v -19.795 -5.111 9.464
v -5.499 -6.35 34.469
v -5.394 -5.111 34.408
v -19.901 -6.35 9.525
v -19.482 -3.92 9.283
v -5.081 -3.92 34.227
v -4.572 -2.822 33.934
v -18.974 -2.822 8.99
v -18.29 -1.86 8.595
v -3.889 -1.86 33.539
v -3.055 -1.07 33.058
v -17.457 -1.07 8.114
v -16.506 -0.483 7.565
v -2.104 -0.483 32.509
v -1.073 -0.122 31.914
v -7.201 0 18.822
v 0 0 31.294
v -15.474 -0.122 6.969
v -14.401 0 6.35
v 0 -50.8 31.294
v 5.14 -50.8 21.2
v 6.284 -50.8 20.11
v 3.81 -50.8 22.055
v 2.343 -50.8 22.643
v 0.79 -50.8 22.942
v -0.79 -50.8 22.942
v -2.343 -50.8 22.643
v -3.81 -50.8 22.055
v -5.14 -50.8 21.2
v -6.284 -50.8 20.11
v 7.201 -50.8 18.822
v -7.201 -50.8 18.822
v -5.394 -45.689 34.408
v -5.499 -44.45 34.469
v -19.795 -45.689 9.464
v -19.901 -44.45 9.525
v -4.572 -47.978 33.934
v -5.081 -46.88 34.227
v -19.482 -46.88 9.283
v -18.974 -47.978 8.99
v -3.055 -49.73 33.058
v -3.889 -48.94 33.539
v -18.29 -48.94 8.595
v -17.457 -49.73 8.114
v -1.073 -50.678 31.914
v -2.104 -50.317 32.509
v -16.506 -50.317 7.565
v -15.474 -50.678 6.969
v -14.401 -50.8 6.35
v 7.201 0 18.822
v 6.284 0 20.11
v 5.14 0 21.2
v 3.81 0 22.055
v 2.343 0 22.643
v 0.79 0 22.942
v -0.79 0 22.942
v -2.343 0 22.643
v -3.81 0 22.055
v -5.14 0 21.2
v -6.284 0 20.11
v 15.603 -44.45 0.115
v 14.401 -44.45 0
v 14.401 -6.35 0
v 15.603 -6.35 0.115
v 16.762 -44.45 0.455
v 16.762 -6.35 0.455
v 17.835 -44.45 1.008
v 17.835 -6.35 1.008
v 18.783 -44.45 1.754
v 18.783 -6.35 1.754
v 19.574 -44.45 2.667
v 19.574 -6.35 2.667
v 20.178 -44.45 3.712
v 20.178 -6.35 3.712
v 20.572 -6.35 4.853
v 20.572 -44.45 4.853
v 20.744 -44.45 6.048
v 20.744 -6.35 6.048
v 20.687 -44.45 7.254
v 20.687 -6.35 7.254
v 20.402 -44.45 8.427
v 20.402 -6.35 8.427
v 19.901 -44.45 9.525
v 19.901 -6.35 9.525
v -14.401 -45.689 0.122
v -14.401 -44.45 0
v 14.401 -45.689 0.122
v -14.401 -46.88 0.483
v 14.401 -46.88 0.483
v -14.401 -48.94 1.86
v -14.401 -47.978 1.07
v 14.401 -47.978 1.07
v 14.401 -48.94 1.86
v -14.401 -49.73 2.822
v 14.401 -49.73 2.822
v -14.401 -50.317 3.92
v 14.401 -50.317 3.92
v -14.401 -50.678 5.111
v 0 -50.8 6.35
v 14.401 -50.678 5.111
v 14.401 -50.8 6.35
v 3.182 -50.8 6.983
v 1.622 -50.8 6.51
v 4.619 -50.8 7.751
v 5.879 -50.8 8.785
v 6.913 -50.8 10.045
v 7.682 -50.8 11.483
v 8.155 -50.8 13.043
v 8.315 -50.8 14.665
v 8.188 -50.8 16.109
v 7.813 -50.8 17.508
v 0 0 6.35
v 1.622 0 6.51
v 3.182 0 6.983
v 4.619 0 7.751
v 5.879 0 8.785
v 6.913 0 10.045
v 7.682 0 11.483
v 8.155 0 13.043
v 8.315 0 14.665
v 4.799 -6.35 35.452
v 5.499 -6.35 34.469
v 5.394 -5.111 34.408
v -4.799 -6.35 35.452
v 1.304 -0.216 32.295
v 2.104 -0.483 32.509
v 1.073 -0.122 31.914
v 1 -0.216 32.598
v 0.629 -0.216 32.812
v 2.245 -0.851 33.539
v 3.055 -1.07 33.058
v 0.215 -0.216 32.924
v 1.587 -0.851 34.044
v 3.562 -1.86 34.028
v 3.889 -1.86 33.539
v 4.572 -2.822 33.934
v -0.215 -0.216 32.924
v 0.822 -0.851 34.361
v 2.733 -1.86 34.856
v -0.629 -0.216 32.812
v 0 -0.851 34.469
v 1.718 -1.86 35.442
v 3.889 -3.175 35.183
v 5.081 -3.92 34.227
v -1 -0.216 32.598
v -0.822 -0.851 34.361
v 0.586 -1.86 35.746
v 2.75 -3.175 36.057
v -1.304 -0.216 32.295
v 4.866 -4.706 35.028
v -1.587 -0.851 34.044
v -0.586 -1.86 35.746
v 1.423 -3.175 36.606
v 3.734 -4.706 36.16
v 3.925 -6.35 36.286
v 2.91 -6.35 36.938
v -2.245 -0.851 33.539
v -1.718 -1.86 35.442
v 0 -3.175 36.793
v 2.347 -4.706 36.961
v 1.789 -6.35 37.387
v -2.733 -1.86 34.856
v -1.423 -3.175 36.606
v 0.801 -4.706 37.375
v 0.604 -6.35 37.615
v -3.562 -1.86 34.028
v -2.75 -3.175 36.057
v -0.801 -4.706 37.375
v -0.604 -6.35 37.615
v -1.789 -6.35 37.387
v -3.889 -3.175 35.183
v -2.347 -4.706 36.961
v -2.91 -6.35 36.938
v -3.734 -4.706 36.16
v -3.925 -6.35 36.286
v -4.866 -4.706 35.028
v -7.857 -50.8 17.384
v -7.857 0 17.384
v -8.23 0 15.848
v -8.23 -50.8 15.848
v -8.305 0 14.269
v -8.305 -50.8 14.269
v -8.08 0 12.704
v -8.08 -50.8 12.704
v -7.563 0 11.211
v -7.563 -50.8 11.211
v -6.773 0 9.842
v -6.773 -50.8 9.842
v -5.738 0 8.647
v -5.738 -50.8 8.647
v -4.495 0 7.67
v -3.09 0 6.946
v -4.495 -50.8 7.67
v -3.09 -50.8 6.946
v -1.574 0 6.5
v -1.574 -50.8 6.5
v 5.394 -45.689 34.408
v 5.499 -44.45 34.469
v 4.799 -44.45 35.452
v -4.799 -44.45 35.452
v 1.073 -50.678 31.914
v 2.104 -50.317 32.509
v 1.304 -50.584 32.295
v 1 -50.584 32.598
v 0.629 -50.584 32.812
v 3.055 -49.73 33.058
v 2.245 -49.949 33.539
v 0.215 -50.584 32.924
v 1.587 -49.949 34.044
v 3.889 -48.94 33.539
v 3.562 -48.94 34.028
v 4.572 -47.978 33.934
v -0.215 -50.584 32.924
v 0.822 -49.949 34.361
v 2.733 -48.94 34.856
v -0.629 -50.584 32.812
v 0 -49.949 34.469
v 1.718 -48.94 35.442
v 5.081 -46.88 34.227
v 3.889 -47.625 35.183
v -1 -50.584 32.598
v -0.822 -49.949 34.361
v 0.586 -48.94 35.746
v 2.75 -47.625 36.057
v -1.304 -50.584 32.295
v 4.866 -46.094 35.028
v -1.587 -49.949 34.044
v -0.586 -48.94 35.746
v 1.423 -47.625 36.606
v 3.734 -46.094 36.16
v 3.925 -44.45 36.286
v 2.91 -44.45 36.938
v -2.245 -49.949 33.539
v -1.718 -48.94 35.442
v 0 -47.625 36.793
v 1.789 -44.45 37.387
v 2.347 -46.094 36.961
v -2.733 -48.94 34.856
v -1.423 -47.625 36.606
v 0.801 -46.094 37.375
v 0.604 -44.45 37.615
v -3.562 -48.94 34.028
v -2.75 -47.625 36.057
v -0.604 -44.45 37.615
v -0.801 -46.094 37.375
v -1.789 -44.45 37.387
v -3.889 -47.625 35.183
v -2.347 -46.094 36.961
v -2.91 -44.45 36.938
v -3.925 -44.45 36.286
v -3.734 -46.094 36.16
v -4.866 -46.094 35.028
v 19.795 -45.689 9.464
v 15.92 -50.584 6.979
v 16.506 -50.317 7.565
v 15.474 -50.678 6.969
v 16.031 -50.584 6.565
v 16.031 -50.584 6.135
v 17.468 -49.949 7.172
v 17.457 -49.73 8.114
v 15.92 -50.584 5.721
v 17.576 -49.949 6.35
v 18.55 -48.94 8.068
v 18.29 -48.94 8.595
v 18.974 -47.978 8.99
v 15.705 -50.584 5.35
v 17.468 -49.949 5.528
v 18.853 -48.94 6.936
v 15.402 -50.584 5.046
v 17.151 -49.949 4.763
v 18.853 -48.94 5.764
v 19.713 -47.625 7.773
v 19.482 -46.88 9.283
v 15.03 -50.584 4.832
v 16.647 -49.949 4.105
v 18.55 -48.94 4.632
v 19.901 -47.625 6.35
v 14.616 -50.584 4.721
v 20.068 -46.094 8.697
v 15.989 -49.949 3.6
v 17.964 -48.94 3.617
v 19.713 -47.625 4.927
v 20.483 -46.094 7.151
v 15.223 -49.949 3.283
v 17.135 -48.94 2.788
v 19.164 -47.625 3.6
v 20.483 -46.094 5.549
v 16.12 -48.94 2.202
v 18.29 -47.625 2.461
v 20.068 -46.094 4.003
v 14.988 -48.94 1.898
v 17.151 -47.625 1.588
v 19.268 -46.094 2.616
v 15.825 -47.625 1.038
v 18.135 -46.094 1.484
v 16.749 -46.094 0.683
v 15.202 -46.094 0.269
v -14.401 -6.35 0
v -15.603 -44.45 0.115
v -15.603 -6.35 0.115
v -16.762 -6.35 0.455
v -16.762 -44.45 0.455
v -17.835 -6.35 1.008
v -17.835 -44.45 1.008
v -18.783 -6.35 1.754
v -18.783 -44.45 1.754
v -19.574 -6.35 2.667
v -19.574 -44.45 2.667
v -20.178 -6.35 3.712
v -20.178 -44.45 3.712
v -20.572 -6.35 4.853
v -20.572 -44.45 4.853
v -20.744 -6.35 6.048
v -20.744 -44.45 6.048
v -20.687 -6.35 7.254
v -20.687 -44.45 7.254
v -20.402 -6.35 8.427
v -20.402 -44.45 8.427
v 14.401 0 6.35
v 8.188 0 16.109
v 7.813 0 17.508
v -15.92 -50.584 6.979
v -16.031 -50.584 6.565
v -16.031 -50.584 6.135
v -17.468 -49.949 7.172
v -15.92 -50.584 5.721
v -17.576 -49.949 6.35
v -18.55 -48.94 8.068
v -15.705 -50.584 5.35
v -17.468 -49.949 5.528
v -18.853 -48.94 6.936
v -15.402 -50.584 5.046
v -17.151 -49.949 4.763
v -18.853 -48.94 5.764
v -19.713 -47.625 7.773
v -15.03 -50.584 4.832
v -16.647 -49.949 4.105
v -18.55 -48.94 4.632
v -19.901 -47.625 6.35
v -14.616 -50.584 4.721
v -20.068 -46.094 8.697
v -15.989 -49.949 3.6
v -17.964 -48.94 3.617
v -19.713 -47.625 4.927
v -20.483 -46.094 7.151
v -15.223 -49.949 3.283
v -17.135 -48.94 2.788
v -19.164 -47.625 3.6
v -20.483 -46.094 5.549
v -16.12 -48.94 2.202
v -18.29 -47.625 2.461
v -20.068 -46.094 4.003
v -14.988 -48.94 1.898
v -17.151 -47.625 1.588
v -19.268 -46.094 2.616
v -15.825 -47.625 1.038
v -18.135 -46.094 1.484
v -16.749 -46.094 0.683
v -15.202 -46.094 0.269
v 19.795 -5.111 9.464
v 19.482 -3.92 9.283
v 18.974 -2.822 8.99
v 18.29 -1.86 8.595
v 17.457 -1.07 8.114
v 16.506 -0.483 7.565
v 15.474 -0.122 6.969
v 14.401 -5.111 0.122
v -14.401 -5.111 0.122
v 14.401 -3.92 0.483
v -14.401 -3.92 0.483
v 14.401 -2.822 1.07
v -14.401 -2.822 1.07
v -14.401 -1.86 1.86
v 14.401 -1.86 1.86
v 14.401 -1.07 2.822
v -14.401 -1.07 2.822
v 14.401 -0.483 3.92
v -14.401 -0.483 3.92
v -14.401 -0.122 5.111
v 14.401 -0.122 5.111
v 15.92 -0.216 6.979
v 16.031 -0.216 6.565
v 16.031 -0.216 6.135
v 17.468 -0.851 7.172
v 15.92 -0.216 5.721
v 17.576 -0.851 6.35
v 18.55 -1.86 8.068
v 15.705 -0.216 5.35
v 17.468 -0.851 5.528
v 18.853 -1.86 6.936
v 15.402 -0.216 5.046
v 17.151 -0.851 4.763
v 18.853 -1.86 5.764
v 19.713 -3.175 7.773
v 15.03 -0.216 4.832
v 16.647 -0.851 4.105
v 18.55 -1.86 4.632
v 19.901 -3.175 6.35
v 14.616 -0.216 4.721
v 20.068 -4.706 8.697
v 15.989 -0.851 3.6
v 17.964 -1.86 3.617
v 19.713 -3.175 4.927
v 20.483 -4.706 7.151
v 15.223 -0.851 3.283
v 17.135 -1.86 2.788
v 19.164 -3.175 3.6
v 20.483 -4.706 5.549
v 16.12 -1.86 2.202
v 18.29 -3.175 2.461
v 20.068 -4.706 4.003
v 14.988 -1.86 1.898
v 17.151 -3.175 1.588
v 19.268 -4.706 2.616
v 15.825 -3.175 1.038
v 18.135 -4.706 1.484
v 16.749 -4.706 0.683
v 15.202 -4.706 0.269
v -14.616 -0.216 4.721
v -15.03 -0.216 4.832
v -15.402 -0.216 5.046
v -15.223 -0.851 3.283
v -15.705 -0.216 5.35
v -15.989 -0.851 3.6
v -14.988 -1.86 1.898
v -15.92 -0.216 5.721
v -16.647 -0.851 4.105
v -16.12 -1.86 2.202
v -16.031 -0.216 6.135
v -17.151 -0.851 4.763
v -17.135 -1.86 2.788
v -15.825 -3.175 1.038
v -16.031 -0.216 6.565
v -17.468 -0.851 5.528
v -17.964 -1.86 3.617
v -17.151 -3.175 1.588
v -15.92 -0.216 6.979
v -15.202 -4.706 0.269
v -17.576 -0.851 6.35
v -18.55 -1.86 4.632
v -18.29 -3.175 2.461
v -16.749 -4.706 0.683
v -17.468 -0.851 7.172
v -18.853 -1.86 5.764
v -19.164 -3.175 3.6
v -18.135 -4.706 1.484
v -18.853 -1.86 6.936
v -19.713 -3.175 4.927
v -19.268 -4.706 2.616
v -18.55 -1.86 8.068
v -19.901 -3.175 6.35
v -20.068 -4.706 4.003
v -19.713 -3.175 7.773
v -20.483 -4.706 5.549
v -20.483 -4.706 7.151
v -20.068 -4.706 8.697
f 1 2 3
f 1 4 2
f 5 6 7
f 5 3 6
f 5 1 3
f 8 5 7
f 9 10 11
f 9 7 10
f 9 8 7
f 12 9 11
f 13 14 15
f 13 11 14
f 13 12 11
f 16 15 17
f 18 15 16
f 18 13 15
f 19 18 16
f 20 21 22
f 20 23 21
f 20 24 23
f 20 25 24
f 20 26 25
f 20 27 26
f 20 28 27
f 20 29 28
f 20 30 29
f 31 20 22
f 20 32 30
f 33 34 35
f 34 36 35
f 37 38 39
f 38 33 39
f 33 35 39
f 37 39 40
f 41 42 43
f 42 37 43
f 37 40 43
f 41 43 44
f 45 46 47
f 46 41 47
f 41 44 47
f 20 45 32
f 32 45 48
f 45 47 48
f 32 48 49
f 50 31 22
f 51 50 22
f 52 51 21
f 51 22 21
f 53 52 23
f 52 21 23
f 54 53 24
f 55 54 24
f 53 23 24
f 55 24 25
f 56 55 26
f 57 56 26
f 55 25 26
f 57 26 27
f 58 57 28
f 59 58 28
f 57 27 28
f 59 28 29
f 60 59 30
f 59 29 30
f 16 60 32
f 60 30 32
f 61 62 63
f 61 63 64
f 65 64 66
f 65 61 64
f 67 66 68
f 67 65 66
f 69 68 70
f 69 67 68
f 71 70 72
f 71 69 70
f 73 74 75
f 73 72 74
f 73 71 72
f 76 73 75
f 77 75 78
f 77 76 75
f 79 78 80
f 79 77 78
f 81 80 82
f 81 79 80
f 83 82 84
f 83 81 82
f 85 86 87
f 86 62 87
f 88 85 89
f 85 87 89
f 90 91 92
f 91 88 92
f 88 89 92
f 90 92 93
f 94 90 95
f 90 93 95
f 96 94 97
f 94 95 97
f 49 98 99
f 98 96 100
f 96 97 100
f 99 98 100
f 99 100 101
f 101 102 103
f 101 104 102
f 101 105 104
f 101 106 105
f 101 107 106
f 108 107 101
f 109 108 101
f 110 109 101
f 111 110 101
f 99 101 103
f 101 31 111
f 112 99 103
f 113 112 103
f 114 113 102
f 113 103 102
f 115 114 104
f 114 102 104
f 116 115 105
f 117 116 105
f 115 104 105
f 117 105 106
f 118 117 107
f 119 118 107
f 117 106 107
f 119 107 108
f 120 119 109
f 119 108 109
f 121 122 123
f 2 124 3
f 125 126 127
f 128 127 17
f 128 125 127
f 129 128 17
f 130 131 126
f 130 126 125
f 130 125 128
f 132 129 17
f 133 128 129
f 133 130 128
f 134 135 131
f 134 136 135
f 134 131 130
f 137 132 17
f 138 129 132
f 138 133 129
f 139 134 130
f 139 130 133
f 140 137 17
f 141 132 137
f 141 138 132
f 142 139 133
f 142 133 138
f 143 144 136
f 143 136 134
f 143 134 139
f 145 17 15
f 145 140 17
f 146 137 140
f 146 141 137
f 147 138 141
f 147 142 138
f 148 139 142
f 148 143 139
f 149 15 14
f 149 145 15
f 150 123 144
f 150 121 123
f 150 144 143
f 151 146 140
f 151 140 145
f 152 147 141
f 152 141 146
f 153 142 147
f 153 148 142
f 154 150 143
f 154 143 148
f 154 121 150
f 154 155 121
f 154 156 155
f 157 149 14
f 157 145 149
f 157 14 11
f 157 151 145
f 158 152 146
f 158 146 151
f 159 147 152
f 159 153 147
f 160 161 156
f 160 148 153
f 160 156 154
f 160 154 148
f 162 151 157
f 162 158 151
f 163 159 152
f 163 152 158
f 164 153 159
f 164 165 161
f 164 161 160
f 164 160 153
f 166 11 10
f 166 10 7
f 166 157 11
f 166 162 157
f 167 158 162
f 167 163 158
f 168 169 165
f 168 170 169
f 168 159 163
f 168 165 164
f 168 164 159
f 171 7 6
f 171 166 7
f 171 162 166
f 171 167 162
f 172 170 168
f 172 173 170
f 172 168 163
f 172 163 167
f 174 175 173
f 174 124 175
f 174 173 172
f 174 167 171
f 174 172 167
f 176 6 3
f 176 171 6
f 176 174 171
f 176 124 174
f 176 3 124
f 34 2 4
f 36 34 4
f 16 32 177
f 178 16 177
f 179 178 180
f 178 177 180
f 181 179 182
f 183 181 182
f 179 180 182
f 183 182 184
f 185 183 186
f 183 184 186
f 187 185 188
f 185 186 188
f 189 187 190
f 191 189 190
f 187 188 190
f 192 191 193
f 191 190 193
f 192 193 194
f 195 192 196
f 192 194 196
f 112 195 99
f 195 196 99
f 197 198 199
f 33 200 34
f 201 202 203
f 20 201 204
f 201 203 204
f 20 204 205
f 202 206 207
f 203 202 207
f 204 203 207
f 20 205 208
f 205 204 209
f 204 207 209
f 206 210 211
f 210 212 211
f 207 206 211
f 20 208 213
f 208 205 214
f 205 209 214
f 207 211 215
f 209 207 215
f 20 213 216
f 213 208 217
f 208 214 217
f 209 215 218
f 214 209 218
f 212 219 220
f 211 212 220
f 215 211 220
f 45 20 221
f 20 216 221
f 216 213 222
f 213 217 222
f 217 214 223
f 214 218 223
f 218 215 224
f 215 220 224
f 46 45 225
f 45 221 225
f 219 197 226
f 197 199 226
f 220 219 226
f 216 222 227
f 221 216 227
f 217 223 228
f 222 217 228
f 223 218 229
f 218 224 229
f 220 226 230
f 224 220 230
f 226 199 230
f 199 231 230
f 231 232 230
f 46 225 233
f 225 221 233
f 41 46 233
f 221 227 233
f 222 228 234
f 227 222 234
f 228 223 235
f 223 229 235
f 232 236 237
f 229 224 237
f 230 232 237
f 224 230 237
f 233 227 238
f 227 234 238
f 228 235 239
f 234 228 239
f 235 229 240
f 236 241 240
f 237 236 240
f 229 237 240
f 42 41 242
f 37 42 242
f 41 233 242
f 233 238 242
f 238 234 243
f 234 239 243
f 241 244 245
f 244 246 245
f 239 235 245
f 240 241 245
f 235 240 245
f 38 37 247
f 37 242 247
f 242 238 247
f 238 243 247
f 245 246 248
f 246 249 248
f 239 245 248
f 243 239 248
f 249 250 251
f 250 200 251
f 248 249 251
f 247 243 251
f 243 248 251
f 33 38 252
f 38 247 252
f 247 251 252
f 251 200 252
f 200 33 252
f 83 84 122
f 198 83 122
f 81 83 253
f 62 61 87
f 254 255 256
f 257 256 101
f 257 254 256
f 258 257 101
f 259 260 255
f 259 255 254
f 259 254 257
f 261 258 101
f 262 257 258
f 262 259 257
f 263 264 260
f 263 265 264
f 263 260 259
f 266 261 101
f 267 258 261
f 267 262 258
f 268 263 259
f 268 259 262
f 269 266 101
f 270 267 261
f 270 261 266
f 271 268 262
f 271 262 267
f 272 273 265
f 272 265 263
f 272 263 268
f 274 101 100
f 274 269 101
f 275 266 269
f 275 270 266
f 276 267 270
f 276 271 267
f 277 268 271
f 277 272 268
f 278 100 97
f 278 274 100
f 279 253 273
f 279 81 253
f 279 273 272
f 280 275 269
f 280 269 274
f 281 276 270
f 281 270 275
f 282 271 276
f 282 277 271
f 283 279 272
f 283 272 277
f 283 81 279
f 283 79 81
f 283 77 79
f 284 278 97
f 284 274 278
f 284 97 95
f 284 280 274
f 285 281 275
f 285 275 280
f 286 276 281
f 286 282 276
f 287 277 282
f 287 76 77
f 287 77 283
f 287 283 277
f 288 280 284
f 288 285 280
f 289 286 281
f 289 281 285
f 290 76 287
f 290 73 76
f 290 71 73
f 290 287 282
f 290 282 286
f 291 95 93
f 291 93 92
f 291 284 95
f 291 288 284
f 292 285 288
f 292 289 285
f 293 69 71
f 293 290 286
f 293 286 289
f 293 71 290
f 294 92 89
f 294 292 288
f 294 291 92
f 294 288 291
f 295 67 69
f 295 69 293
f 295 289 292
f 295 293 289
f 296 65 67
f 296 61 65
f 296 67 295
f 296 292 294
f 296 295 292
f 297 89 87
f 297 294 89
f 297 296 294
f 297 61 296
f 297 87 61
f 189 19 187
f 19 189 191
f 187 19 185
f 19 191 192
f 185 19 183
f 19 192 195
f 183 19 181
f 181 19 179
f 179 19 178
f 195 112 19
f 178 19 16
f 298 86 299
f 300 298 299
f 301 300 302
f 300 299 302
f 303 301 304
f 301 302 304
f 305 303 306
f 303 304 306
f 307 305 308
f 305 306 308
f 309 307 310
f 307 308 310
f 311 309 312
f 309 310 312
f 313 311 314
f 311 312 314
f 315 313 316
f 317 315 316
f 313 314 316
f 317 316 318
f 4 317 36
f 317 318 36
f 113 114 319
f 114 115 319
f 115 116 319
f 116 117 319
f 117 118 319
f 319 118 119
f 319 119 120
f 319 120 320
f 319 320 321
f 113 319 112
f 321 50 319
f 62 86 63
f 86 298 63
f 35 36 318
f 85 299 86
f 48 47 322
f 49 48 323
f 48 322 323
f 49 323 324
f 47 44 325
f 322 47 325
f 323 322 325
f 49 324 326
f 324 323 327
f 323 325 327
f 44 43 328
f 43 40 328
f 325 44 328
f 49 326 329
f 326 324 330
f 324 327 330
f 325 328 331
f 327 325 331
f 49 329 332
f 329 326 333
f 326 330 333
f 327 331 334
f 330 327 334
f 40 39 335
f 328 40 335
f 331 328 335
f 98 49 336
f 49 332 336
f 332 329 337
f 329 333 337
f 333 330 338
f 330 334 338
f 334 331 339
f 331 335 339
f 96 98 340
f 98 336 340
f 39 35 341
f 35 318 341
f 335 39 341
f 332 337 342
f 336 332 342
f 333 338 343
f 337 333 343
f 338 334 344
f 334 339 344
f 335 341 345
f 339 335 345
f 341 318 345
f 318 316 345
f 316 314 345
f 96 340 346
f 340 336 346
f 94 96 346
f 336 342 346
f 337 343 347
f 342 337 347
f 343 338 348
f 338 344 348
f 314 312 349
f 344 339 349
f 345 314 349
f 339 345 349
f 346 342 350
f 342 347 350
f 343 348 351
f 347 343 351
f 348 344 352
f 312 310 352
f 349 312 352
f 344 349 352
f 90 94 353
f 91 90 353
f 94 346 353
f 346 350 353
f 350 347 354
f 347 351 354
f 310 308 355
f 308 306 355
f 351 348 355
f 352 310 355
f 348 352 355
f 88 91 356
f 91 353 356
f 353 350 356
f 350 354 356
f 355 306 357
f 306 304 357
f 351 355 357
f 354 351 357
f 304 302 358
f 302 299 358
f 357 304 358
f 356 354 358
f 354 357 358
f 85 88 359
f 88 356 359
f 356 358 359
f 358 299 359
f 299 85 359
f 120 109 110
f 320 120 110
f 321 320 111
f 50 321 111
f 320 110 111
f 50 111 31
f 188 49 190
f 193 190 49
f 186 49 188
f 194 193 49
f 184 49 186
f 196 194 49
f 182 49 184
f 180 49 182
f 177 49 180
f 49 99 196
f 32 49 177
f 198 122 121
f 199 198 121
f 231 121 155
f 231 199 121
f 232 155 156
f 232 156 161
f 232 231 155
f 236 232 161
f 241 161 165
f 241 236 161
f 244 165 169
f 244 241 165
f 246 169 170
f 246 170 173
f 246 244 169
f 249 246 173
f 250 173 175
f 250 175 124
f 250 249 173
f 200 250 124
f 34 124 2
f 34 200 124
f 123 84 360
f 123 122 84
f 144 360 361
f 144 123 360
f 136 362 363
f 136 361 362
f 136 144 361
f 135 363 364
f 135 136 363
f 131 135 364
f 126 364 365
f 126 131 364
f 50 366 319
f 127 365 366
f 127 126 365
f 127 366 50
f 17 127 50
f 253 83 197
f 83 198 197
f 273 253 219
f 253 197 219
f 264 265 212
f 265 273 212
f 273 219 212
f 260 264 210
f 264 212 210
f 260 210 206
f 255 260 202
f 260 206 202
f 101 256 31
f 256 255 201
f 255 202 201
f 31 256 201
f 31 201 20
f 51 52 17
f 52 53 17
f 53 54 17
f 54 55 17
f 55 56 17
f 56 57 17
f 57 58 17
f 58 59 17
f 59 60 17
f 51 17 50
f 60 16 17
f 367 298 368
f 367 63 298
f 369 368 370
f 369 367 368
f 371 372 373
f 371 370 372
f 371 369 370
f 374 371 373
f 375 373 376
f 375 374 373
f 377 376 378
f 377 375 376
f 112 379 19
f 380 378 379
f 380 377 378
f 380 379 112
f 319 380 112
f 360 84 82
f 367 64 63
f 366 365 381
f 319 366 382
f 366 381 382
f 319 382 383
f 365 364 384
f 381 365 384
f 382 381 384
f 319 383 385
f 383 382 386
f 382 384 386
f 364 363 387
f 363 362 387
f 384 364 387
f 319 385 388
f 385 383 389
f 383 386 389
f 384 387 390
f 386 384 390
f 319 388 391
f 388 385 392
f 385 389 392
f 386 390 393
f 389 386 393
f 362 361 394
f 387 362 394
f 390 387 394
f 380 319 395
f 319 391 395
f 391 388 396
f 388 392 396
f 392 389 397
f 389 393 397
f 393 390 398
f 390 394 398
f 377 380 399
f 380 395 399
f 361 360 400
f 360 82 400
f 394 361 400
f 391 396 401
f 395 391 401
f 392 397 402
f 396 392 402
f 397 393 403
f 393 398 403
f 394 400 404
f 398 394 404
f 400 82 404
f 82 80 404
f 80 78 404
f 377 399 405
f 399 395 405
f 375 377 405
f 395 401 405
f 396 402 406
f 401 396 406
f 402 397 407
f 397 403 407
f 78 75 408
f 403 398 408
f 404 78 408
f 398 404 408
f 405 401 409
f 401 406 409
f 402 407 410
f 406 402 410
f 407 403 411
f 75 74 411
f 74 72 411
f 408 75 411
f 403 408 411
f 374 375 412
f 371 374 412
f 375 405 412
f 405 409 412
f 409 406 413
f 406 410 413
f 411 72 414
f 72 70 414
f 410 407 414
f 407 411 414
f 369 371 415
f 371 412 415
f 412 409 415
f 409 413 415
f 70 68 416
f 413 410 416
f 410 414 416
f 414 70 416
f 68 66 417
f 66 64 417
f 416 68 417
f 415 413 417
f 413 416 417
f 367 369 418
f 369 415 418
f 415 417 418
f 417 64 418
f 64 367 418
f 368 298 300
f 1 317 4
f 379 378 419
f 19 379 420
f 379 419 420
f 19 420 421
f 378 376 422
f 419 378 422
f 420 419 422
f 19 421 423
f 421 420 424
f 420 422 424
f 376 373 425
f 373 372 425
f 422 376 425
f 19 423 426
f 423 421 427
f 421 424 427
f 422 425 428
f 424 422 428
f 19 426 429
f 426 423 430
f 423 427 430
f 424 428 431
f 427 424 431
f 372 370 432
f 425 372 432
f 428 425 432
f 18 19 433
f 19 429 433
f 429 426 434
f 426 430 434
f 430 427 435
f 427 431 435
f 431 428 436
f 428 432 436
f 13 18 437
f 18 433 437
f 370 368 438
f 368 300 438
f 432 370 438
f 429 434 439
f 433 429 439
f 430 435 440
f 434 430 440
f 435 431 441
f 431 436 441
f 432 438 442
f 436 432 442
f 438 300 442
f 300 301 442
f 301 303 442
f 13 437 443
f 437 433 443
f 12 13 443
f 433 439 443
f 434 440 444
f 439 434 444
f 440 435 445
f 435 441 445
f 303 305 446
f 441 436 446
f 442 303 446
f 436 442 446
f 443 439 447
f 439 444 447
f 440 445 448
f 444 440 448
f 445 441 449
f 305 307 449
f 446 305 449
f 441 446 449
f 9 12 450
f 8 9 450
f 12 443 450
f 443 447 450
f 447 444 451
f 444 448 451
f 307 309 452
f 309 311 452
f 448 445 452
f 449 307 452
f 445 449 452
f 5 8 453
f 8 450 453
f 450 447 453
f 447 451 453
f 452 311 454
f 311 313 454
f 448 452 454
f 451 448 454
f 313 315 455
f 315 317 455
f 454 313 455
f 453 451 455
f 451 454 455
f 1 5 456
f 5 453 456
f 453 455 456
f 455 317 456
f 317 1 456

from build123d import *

# Parameters (mm, degrees)
F1_DEPTH      = 50.8
F2_R          = 6.35
F4_DEPTH      = 68.834
F4_DEPTH_BACK = 105


# Not quite as in the source:
# - an extrude ends at something that could not be found from the text; its depth is read off the source's solid


with BuildPart() as f1:
    # F0 (on Front) → F1 (new body)
    with BuildSketch(Plane.XZ):
        Polygon((-25.4, 0), (0, 0), (25.4, 0), (0, 43.9940905122), align=None)
    extrude(amount=F1_DEPTH)

    # F2
    f2_edges = [f1.edges().sort_by_distance(p)[0] for p in [
        (0, -25.4, 43.994091),
        (12.7, -50.8, 21.997045),
        (-12.7, -50.8, 21.997045),
        (0, -50.8, 0),
        (25.4, -25.4, 0),
        (12.7, 0, 21.997045),
        (0, 0, 0),
        (-12.7, 0, 21.997045),
        (-25.4, -25.4, 0),
    ]]
    fillet(f2_edges, radius=F2_R)

    # F3 (on face) → F4 (cut, two sides)
    with BuildSketch(Plane.XZ.offset(50.8)) as f4_sk:
        with BuildLine():
            ThreePointArc((0, 6.35), (5.8793785172, 8.7853183202), (8.3146968374, 14.6646968374))
            ThreePointArc((8.3146968374, 14.6646968374), (8.0313803879, 16.8166988268), (7.200738589, 18.822045424))
            ThreePointArc((7.200738589, 18.822045424), (-9.37e-08, 22.9793936748), (-7.2007386828, 18.8220452616))
            ThreePointArc((-7.2007386828, 18.8220452616), (-7.2007386876, 10.5073484215), (0, 6.35))
        make_face()
    extrude(amount=-F4_DEPTH, mode=Mode.SUBTRACT)
    extrude(f4_sk.sketch, amount=F4_DEPTH_BACK, mode=Mode.SUBTRACT)


solid = f1.part
